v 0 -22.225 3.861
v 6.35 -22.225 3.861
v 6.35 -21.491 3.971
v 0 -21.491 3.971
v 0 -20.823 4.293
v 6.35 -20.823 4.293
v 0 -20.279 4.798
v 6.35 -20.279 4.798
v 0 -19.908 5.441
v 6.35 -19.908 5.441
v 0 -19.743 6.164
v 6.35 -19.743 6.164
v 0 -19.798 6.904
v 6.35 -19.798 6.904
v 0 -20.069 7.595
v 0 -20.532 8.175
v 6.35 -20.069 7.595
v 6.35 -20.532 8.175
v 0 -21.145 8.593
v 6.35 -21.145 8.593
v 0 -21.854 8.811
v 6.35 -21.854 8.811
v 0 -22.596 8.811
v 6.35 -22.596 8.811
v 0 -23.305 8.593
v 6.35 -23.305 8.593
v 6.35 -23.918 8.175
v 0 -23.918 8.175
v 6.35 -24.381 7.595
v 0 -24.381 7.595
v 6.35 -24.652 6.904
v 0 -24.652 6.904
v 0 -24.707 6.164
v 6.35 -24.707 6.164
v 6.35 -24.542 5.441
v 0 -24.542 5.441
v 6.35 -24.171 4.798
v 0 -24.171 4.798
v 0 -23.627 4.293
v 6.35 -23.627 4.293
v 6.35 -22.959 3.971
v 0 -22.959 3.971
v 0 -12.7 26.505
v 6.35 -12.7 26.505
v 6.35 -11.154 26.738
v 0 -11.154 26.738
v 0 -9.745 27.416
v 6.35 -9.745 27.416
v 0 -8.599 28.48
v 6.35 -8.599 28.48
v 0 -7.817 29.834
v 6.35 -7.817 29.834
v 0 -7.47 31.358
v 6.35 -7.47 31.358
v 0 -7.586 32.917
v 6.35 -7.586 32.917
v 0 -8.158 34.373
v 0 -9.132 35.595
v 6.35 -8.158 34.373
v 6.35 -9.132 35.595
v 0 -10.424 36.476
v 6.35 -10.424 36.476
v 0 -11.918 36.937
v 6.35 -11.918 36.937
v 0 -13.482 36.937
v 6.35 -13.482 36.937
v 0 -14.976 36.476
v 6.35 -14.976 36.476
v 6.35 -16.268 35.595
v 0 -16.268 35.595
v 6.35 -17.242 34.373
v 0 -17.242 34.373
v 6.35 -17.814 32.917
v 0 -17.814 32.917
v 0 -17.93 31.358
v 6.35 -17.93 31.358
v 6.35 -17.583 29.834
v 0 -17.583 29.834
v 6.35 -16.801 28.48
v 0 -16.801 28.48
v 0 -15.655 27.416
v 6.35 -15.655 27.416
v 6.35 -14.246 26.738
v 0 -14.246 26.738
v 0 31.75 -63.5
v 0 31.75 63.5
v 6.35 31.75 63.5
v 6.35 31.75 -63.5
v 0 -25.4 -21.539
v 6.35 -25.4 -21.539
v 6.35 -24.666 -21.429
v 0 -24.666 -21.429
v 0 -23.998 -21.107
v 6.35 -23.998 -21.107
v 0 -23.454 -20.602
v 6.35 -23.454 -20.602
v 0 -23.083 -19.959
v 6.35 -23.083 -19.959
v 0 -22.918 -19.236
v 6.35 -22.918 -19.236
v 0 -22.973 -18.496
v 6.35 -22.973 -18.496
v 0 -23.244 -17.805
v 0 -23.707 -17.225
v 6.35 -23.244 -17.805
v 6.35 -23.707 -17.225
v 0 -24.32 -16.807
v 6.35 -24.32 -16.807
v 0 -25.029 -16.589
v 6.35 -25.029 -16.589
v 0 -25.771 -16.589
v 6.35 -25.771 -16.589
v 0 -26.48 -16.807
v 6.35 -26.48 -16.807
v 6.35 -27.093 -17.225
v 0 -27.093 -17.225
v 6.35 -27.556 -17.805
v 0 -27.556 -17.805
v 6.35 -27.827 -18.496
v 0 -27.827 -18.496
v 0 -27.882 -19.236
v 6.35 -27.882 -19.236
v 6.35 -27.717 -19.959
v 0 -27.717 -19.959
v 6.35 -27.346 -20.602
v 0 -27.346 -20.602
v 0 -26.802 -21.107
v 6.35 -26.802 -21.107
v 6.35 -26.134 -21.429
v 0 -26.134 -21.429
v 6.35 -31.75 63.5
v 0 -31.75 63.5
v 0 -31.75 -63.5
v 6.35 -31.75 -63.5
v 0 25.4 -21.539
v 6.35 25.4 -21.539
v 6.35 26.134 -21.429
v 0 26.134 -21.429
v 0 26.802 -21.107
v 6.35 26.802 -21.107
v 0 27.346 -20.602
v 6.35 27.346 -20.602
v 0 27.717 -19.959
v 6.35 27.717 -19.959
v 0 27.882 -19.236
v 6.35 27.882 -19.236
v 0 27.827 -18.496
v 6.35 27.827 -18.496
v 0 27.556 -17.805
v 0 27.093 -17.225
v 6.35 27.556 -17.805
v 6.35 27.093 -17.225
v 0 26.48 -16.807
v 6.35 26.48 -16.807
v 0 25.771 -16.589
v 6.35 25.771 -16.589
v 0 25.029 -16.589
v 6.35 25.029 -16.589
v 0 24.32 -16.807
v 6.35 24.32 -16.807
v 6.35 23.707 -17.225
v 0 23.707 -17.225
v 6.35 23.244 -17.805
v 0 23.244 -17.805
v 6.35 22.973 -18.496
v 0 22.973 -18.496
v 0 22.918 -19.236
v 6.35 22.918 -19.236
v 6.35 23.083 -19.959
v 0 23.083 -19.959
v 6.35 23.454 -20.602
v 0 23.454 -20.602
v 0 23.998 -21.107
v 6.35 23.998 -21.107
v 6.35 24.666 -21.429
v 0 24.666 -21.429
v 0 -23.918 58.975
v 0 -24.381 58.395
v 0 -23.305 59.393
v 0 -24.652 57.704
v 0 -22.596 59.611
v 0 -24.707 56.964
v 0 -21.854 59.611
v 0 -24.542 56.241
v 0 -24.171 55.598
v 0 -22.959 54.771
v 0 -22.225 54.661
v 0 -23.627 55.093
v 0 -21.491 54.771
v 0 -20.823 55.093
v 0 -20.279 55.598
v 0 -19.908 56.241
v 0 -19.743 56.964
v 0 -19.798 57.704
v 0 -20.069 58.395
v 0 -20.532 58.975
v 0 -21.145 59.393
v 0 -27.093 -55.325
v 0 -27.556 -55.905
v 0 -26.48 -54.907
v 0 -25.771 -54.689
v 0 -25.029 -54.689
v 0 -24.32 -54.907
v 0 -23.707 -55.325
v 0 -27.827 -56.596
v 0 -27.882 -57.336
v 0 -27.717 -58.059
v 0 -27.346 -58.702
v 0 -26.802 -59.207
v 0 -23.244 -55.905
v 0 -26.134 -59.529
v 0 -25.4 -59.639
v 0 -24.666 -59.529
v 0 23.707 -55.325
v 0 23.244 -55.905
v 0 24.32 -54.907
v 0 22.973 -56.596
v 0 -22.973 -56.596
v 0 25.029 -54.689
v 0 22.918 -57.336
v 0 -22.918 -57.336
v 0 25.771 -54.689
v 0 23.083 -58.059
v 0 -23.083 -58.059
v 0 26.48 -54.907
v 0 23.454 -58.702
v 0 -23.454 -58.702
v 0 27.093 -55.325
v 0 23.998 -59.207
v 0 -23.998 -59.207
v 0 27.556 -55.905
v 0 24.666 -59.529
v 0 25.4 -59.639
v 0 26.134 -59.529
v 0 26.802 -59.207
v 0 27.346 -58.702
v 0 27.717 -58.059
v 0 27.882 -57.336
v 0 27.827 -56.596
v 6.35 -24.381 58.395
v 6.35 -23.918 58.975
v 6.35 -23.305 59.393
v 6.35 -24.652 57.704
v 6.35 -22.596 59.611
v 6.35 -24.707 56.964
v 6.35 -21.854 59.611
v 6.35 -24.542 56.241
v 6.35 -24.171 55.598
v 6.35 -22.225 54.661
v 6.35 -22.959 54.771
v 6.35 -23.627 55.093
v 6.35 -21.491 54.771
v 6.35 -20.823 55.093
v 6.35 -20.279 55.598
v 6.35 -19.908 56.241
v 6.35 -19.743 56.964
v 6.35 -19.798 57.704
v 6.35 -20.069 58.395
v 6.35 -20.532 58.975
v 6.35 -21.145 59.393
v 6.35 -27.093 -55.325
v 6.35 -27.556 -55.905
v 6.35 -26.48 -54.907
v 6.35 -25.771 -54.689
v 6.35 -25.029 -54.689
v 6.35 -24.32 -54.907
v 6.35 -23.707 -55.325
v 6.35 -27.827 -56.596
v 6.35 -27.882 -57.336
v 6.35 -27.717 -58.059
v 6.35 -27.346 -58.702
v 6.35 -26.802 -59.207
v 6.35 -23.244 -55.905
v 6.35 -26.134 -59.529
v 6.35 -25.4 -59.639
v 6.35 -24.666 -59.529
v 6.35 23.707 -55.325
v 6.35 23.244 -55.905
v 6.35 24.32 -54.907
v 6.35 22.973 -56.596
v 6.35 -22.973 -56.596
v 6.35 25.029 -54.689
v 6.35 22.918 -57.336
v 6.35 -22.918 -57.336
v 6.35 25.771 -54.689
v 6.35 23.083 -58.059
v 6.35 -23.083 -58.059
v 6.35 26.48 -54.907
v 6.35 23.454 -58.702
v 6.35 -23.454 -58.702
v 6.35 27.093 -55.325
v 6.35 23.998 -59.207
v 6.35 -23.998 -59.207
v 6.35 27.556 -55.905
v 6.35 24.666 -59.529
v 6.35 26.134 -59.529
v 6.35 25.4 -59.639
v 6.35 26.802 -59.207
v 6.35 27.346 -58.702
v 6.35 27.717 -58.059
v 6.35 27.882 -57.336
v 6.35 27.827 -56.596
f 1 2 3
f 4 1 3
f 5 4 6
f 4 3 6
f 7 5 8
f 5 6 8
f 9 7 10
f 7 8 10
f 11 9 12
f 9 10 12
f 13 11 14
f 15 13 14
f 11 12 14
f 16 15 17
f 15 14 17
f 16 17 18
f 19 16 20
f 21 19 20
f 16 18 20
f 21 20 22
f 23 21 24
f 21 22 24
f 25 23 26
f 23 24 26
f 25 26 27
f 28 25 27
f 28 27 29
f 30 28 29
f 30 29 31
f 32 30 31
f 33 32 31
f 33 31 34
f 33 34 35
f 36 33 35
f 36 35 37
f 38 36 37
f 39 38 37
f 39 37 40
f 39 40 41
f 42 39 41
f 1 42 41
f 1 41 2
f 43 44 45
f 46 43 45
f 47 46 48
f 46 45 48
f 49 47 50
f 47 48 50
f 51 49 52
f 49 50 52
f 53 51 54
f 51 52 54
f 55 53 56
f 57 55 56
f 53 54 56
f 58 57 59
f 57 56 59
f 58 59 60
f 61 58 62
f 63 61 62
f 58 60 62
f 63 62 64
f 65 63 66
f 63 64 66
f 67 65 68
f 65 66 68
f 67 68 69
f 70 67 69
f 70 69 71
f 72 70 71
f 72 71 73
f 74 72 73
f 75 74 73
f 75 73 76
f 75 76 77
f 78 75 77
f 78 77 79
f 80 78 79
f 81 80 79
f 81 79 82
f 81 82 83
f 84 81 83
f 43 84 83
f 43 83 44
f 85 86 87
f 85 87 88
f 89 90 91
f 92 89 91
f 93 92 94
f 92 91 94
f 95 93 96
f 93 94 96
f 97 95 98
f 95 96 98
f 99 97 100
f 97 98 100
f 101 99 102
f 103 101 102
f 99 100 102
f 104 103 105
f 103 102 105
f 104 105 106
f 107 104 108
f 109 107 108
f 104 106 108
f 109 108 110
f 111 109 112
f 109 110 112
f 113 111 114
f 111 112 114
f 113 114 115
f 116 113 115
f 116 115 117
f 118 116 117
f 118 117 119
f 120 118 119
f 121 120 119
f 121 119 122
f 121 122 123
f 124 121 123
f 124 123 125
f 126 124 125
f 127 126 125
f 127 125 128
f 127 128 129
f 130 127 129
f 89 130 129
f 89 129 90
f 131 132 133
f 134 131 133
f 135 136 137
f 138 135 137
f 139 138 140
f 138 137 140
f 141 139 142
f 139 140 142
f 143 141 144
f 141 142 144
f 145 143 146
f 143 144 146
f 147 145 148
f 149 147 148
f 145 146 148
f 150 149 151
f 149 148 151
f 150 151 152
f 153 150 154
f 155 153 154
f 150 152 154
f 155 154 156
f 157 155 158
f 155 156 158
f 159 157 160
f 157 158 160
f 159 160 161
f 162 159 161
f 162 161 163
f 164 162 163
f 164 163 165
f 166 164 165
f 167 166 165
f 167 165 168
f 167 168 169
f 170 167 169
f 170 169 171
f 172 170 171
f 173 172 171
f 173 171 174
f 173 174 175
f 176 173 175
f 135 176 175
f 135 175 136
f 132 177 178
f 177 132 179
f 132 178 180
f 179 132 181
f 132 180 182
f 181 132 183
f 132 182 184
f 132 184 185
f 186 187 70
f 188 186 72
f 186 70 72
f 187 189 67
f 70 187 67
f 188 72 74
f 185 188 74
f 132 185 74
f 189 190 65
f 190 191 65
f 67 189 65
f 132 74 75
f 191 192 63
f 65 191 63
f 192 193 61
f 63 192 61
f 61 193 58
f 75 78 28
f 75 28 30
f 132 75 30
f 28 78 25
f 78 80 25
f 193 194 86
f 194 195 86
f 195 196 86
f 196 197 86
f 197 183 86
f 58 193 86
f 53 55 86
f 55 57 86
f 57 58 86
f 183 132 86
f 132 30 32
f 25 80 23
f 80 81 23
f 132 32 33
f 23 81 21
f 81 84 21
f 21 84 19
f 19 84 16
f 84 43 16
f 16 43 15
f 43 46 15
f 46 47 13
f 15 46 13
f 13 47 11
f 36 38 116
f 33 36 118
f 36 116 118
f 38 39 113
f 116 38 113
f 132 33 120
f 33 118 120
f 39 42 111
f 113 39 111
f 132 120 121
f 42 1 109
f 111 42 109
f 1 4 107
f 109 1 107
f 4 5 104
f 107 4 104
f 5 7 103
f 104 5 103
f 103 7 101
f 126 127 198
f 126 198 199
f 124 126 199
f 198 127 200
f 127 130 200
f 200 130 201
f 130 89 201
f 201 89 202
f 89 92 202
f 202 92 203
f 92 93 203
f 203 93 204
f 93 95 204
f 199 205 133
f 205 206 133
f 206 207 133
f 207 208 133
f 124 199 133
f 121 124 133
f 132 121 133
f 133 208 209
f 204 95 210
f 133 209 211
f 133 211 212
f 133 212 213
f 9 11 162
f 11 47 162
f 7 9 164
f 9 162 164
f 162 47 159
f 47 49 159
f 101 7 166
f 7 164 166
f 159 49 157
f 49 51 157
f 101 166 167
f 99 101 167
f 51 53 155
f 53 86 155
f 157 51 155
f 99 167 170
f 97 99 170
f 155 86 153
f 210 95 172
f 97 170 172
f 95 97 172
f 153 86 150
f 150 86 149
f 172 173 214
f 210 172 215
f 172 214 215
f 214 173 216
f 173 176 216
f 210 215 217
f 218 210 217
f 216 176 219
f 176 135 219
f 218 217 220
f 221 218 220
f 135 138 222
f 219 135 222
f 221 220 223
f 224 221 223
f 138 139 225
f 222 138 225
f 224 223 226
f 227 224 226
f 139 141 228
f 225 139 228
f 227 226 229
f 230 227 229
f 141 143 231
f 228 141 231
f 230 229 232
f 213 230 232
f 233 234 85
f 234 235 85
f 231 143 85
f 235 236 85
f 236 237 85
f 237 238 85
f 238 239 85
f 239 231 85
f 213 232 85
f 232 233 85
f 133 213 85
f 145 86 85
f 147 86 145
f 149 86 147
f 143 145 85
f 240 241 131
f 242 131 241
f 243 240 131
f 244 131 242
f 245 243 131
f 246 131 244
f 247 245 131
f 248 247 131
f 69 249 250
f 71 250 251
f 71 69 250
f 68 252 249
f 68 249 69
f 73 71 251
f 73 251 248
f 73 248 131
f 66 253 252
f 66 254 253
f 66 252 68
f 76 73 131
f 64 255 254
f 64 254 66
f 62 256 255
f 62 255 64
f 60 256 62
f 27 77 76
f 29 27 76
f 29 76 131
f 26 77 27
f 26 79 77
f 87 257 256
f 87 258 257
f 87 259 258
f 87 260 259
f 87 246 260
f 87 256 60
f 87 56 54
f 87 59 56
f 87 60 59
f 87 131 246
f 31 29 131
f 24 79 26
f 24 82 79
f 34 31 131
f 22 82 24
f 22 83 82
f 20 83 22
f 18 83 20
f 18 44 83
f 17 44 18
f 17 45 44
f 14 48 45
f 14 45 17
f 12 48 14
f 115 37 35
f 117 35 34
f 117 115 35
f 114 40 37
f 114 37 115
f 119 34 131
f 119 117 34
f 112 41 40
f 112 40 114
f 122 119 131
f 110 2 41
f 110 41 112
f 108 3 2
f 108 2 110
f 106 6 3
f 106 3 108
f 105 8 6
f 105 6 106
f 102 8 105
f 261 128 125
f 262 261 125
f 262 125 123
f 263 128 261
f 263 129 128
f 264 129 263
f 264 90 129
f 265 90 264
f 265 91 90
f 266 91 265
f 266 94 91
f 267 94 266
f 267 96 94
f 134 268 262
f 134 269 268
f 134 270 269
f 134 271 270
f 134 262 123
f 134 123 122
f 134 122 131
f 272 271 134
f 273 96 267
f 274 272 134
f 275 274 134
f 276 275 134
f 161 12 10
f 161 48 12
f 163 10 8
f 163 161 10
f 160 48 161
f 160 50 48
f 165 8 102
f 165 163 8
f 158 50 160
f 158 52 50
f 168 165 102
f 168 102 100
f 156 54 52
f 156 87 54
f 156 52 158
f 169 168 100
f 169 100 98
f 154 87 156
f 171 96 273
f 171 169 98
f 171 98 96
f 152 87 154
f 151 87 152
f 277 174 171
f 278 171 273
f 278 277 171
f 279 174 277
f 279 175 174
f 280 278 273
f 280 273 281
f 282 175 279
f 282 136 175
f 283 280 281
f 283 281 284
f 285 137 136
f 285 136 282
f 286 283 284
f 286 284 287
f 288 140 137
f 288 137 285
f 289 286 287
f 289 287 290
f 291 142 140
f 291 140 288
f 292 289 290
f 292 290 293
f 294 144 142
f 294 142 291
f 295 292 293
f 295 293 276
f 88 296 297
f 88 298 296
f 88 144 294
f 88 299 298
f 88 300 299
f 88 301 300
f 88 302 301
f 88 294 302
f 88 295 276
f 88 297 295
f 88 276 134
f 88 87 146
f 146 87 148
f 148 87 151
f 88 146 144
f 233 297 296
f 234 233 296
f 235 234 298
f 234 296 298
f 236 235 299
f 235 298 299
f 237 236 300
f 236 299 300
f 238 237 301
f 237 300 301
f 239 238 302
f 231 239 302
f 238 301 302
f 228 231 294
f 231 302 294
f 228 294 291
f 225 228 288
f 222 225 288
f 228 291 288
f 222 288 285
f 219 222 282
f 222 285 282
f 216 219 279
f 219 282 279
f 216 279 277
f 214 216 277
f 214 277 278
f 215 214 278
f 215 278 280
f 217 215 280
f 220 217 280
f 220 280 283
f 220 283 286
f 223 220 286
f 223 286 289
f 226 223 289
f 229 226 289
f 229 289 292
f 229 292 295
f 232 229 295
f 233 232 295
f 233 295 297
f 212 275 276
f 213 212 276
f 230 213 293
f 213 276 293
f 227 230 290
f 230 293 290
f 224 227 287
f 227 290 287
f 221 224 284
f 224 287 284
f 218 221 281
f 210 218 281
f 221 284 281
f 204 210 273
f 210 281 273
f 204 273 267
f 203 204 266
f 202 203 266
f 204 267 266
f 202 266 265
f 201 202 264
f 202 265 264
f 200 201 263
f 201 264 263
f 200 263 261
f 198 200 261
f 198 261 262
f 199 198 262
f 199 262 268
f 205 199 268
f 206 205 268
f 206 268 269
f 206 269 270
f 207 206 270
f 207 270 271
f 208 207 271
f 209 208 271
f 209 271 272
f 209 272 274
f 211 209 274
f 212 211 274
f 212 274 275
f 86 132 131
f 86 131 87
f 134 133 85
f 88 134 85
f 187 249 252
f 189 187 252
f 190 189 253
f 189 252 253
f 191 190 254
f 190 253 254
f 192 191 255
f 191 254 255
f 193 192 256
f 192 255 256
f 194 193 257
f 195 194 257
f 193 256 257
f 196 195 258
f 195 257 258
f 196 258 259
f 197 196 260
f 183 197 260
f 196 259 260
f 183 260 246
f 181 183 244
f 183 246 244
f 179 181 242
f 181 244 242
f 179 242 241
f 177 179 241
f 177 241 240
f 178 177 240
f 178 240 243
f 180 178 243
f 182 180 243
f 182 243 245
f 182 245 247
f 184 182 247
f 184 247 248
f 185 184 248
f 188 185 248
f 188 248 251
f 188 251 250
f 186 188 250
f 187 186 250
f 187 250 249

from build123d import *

# Parameters (mm, degrees)
SKETCH1_W                      = 127
SKETCH1_H                      = 63.5
BOSS_EXTRUDE1_DEPTH            = 6.35
F_9_0_196_DIAMETER_HOLE1_D     = 4.9784
F_9_0_196_DIAMETER_HOLE1_DEPTH = 70.104
F_9_0_196_DIAMETER_HOLE1_TIP   = 1.495662253
F_9_0_196_DIAMETER_HOLE2_D     = 4.9784
F_9_0_196_DIAMETER_HOLE2_DEPTH = 70.104
F_9_0_196_DIAMETER_HOLE2_TIP   = 1.495662253
Z_0_413_DIAMETER_HOLE1_D       = 10.4902
Z_0_413_DIAMETER_HOLE1_DEPTH   = 70.104
Z_0_413_DIAMETER_HOLE1_TIP     = 3.151574033


with BuildPart() as part:
    # Sketch1 → Boss-Extrude1 (new body)
    with BuildSketch(Plane(origin=(0, 0, 0), x_dir=(0, 0, -1), z_dir=(1, 0, 0))):
        Rectangle(SKETCH1_W, SKETCH1_H)
    extrude(amount=BOSS_EXTRUDE1_DEPTH)

    # #9 (0.196) Diameter Hole1
    with Locations(Plane.ZY):
        with Locations((57.15, -22.225), (6.35, -22.225)):
            Hole(F_9_0_196_DIAMETER_HOLE1_D / 2, depth=F_9_0_196_DIAMETER_HOLE1_DEPTH)
            with Locations((0, 0, -(F_9_0_196_DIAMETER_HOLE1_DEPTH + F_9_0_196_DIAMETER_HOLE1_TIP / 2))):  # 118° drill point
                Cone(0, F_9_0_196_DIAMETER_HOLE1_D / 2, F_9_0_196_DIAMETER_HOLE1_TIP, mode=Mode.SUBTRACT)

    # #9 (0.196) Diameter Hole2
    with Locations(Plane.ZY):
        with Locations((-57.15, -25.4), (-19.05, -25.4), (-19.05, 25.4), (-57.15, 25.4)):
            Hole(F_9_0_196_DIAMETER_HOLE2_D / 2, depth=F_9_0_196_DIAMETER_HOLE2_DEPTH)
            with Locations((0, 0, -(F_9_0_196_DIAMETER_HOLE2_DEPTH + F_9_0_196_DIAMETER_HOLE2_TIP / 2))):  # 118° drill point
                Cone(0, F_9_0_196_DIAMETER_HOLE2_D / 2, F_9_0_196_DIAMETER_HOLE2_TIP, mode=Mode.SUBTRACT)

    # Z (0.413) Diameter Hole1
    with Locations(Plane.ZY):
        with Locations((31.75, -12.7)):
            Hole(Z_0_413_DIAMETER_HOLE1_D / 2, depth=Z_0_413_DIAMETER_HOLE1_DEPTH)
            with Locations((0, 0, -(Z_0_413_DIAMETER_HOLE1_DEPTH + Z_0_413_DIAMETER_HOLE1_TIP / 2))):  # 118° drill point
                Cone(0, Z_0_413_DIAMETER_HOLE1_D / 2, Z_0_413_DIAMETER_HOLE1_TIP, mode=Mode.SUBTRACT)


solid = part.part
